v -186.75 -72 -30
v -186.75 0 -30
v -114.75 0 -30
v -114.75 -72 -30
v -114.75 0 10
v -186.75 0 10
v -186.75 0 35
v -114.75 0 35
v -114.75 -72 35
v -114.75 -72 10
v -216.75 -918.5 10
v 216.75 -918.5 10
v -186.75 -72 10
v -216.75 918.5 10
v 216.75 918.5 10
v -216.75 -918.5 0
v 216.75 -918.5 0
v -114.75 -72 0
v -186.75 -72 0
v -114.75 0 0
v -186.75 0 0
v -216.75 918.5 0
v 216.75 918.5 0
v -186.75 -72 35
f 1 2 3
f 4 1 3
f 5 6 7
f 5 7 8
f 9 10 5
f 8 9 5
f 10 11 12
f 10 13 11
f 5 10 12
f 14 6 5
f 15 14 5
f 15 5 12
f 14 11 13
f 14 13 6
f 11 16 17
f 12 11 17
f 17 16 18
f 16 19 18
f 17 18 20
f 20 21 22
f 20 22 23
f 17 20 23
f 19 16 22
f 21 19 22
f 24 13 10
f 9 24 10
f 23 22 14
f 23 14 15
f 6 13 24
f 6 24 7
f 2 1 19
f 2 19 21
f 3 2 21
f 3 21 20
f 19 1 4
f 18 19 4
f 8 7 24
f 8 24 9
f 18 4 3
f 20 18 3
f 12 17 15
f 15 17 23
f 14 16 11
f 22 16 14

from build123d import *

# Parameters (mm, degrees)
ESQUISSE1_W             = 433.5
ESQUISSE1_H             = 1837
BOSS_EXTRU_1_DEPTH      = 10
BOSS_EXTRU_2_DEPTH      = 25
BOSS_EXTRU_2_DEPTH_BACK = 40
ESQUISSE2_W             = 72
ESQUISSE2_H             = 72


with BuildPart() as part:
    # Esquisse1 → Boss.-Extru.1 (new body)
    with BuildSketch(Plane.XY):
        Rectangle(ESQUISSE1_W, ESQUISSE1_H)
    extrude(amount=BOSS_EXTRU_1_DEPTH)

    # Esquisse2 → Boss.-Extru.2 (add, two sides: drawn at the far end of the back side and taken through both)
    with BuildSketch(Plane.XY.offset(10).offset(-BOSS_EXTRU_2_DEPTH_BACK)):
        with Locations((-150.75, -36)):
            Rectangle(ESQUISSE2_W, ESQUISSE2_H)
    extrude(amount=BOSS_EXTRU_2_DEPTH + BOSS_EXTRU_2_DEPTH_BACK)


solid = part.part
